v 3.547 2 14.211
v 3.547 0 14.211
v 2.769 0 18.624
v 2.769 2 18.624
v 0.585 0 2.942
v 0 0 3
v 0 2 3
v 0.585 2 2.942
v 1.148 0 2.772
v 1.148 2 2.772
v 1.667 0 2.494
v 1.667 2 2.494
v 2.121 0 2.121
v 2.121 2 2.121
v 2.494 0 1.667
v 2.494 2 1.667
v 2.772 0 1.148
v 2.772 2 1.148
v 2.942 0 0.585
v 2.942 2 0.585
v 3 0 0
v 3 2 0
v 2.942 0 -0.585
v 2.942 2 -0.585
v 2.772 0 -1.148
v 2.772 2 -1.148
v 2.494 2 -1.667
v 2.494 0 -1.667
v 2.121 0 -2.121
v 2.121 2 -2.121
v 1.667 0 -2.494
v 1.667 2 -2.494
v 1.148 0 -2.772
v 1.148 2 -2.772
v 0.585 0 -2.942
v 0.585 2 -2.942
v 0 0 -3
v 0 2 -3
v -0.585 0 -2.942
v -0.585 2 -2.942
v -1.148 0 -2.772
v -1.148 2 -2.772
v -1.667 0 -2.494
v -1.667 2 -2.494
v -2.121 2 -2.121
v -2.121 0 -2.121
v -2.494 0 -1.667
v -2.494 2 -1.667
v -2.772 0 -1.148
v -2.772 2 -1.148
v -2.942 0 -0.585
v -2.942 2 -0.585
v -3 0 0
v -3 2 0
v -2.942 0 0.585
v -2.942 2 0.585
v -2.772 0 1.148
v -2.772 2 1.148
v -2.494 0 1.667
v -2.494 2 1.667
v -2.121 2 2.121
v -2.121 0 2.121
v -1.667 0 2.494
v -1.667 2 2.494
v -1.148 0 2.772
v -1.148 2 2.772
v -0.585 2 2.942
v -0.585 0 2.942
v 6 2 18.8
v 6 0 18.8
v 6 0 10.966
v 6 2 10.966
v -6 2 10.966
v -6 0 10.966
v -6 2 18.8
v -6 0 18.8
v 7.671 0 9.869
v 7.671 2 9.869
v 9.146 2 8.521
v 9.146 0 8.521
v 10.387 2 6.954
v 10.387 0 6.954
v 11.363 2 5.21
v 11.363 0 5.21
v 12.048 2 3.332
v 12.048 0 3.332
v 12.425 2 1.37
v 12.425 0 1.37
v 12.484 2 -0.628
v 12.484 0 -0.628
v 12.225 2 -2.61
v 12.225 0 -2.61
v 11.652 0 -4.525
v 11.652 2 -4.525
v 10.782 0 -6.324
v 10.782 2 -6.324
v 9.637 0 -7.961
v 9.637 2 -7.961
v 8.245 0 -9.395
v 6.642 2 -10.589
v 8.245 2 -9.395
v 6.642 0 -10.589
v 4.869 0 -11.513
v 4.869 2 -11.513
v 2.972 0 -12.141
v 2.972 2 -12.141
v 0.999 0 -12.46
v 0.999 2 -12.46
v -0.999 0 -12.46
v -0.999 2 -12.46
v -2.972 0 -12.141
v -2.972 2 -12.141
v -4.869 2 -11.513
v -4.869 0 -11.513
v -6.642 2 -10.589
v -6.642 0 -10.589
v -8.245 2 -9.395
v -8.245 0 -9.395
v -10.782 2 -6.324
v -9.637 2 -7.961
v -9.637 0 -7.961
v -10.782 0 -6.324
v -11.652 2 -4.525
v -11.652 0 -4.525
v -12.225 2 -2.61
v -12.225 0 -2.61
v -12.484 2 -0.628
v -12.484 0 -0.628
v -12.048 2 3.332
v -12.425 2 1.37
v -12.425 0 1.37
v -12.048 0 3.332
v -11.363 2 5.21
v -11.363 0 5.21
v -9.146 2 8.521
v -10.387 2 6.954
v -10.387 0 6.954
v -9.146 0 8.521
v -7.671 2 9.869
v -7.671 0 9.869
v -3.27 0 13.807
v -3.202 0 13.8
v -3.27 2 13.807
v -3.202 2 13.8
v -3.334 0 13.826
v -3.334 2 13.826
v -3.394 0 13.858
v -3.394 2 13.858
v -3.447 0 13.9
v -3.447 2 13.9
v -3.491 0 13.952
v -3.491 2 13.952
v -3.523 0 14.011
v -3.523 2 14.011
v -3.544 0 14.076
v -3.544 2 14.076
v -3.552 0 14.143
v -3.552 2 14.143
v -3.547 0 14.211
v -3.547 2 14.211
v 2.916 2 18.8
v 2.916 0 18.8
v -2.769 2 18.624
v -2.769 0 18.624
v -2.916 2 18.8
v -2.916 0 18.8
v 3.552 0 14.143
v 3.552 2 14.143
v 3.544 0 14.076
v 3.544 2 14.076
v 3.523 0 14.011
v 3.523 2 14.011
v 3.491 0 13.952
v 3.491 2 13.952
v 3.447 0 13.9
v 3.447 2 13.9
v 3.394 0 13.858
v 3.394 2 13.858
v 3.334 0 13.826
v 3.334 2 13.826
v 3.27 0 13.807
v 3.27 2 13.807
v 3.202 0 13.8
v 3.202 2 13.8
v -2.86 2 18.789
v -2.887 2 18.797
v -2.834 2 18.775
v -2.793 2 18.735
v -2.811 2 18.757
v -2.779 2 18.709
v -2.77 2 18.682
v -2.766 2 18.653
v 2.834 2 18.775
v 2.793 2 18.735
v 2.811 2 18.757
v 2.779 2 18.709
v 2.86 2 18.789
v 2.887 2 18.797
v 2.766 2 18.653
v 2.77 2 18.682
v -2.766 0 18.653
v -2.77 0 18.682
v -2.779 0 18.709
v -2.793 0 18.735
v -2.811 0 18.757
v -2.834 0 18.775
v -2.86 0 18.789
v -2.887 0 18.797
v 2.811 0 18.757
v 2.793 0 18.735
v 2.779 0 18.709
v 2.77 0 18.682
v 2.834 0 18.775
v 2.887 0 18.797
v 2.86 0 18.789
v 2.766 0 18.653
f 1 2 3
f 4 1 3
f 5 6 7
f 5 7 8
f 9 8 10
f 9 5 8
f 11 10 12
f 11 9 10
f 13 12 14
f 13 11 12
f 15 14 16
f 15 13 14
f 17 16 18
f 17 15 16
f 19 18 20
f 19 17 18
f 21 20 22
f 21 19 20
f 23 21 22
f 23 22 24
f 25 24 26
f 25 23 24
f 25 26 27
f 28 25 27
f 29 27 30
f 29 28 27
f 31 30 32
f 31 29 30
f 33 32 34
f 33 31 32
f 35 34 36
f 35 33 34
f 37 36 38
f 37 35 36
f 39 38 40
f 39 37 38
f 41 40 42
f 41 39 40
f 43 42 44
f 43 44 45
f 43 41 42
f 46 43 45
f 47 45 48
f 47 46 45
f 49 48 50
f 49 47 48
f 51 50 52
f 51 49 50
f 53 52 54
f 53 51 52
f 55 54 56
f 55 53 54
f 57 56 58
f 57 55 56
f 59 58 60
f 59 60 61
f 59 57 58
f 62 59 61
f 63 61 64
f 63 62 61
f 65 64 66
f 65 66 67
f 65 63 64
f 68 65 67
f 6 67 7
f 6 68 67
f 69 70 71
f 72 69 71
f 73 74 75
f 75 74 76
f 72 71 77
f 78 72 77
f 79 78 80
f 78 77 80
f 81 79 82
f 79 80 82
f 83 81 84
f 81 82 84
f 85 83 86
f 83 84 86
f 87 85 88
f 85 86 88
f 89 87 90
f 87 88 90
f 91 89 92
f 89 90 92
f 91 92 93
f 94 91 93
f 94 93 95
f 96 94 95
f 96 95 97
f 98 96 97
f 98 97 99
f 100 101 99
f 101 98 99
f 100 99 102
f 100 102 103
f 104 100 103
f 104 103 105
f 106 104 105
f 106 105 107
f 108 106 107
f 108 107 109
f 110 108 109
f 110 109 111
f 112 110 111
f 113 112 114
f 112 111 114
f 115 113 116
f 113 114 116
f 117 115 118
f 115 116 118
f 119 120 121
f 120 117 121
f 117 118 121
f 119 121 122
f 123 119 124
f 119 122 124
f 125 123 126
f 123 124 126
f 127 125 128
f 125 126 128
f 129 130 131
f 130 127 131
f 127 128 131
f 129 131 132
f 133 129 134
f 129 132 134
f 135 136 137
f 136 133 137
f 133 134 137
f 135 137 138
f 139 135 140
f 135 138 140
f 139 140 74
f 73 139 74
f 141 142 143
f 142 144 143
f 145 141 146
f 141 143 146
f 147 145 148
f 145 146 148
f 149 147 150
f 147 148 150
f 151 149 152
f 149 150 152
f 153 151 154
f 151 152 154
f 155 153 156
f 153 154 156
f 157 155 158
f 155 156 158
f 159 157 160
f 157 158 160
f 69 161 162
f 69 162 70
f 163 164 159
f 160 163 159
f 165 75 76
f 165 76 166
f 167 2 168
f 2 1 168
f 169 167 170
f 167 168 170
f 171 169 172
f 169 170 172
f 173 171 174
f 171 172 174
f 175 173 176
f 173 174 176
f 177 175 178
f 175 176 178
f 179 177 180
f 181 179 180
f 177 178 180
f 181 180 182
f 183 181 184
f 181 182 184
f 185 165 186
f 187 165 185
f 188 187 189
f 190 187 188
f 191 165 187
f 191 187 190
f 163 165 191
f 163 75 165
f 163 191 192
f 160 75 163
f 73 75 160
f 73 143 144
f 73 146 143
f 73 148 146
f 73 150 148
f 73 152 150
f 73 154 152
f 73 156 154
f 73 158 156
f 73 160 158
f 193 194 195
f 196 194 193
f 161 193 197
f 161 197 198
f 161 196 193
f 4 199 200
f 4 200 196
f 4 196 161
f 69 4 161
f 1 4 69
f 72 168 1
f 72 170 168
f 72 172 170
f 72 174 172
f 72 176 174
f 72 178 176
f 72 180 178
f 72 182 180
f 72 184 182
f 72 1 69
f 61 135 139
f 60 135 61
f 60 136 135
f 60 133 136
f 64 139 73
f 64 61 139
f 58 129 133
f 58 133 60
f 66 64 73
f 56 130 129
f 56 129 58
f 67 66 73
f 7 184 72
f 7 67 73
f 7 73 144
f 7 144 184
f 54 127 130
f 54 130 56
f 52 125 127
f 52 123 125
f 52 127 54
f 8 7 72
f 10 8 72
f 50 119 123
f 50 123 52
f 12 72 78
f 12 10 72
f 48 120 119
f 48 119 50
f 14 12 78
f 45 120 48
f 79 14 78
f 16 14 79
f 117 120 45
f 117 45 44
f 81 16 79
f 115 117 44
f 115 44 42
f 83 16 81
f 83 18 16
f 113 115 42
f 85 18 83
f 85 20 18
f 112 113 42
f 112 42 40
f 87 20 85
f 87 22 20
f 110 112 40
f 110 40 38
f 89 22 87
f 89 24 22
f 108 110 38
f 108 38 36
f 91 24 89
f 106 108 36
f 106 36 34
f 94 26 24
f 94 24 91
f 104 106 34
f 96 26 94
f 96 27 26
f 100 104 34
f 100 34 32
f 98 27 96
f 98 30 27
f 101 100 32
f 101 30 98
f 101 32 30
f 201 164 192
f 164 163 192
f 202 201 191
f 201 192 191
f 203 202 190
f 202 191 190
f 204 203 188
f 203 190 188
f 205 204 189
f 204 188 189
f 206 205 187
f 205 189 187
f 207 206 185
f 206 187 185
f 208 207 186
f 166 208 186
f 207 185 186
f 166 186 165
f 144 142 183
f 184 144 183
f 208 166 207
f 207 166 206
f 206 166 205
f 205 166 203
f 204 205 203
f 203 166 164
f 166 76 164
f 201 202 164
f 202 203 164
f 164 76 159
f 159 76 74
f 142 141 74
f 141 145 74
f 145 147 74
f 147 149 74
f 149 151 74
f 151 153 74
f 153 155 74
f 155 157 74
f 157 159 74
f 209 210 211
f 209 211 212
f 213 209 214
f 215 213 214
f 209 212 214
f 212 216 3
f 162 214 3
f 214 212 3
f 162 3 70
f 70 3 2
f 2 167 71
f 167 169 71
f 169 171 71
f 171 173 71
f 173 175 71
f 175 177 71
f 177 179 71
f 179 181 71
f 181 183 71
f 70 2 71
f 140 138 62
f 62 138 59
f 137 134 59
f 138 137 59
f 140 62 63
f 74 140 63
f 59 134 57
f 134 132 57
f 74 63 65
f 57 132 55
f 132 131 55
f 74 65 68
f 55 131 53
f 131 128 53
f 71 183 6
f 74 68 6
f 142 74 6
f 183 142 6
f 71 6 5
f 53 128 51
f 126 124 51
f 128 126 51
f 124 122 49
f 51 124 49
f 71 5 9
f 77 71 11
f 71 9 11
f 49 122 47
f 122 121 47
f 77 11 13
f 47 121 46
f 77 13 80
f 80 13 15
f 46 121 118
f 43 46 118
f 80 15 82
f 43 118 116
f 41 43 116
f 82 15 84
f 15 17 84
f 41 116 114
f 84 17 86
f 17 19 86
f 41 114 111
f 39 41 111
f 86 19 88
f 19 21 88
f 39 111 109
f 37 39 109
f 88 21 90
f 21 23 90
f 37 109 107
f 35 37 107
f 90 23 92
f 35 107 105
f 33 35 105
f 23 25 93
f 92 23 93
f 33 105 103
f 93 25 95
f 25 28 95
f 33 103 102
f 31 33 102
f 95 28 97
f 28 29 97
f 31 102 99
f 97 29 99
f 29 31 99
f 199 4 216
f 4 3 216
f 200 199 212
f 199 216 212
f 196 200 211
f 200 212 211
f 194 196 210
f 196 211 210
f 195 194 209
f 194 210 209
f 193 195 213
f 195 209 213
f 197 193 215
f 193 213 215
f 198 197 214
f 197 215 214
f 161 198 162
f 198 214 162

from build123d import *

# Parameters (mm, degrees)
SKETCH1_R           = 3
BOSS_EXTRUDE1_DEPTH = 2
SKETCH2_R           = 12.5
SKETCH2_R_2         = 3
BOSS_EXTRUDE2_DEPTH = 2
SKETCH4_W           = 12
SKETCH4_H           = 0.2
CUT_EXTRUDE1_DEPTH  = 4
FILLET3_R           = 0.35
FILLET4_R           = 0.15


with BuildPart() as part:
    # Sketch1 → Boss-Extrude1 (new body)
    with BuildSketch(Plane(origin=(0, 0, 0), x_dir=(1, 0, 0), z_dir=(0, 1, 0))):
        Polygon((-6, 6), (-6, -13.291502622), (-6, -19), (-2.70227506, -19), (-3.619175359, -13.8), (0, -13.8), (3.619175359, -13.8), (2.70227506, -19), (6, -19), (6, -13.291502622), (6, 6), align=None)
        with Locations(Location((0, 0, 0), (0, 0, 270))):
            Circle(SKETCH1_R, mode=Mode.SUBTRACT)
    extrude(amount=BOSS_EXTRUDE1_DEPTH)

    # Sketch2 → Boss-Extrude2 (add)
    with BuildSketch(Plane(origin=(0, 0, 0), x_dir=(1, 0, 0), z_dir=(0, 1, 0))):
        Circle(SKETCH2_R)
        with Locations(Location((0, 0, 0), (0, 0, 270))):
            Circle(SKETCH2_R_2, mode=Mode.SUBTRACT)
    extrude(amount=BOSS_EXTRUDE2_DEPTH)

    # Sketch4 → Cut-Extrude1 (cut)
    with BuildSketch(Plane(origin=(0, 2, 0), x_dir=(1, 0, 0), z_dir=(0, 1, 0))):
        with Locations((0, -18.9)):
            Rectangle(SKETCH4_W, SKETCH4_H)
    extrude(amount=-CUT_EXTRUDE1_DEPTH, mode=Mode.SUBTRACT)

    # Fillet3
    fillet3_edges = [part.edges().sort_by_distance(p)[0] for p in [
        (3.619175359, 1, 13.8),
        (-3.619175359, 1, 13.8),
    ]]
    fillet(fillet3_edges, radius=FILLET3_R)

    # Fillet4
    fillet4_edges = [part.edges().sort_by_distance(p)[0] for p in [
        (2.737540456, 1, 18.8),
        (-2.737540456, 1, 18.8),
    ]]
    fillet(fillet4_edges, radius=FILLET4_R)


solid = part.part
